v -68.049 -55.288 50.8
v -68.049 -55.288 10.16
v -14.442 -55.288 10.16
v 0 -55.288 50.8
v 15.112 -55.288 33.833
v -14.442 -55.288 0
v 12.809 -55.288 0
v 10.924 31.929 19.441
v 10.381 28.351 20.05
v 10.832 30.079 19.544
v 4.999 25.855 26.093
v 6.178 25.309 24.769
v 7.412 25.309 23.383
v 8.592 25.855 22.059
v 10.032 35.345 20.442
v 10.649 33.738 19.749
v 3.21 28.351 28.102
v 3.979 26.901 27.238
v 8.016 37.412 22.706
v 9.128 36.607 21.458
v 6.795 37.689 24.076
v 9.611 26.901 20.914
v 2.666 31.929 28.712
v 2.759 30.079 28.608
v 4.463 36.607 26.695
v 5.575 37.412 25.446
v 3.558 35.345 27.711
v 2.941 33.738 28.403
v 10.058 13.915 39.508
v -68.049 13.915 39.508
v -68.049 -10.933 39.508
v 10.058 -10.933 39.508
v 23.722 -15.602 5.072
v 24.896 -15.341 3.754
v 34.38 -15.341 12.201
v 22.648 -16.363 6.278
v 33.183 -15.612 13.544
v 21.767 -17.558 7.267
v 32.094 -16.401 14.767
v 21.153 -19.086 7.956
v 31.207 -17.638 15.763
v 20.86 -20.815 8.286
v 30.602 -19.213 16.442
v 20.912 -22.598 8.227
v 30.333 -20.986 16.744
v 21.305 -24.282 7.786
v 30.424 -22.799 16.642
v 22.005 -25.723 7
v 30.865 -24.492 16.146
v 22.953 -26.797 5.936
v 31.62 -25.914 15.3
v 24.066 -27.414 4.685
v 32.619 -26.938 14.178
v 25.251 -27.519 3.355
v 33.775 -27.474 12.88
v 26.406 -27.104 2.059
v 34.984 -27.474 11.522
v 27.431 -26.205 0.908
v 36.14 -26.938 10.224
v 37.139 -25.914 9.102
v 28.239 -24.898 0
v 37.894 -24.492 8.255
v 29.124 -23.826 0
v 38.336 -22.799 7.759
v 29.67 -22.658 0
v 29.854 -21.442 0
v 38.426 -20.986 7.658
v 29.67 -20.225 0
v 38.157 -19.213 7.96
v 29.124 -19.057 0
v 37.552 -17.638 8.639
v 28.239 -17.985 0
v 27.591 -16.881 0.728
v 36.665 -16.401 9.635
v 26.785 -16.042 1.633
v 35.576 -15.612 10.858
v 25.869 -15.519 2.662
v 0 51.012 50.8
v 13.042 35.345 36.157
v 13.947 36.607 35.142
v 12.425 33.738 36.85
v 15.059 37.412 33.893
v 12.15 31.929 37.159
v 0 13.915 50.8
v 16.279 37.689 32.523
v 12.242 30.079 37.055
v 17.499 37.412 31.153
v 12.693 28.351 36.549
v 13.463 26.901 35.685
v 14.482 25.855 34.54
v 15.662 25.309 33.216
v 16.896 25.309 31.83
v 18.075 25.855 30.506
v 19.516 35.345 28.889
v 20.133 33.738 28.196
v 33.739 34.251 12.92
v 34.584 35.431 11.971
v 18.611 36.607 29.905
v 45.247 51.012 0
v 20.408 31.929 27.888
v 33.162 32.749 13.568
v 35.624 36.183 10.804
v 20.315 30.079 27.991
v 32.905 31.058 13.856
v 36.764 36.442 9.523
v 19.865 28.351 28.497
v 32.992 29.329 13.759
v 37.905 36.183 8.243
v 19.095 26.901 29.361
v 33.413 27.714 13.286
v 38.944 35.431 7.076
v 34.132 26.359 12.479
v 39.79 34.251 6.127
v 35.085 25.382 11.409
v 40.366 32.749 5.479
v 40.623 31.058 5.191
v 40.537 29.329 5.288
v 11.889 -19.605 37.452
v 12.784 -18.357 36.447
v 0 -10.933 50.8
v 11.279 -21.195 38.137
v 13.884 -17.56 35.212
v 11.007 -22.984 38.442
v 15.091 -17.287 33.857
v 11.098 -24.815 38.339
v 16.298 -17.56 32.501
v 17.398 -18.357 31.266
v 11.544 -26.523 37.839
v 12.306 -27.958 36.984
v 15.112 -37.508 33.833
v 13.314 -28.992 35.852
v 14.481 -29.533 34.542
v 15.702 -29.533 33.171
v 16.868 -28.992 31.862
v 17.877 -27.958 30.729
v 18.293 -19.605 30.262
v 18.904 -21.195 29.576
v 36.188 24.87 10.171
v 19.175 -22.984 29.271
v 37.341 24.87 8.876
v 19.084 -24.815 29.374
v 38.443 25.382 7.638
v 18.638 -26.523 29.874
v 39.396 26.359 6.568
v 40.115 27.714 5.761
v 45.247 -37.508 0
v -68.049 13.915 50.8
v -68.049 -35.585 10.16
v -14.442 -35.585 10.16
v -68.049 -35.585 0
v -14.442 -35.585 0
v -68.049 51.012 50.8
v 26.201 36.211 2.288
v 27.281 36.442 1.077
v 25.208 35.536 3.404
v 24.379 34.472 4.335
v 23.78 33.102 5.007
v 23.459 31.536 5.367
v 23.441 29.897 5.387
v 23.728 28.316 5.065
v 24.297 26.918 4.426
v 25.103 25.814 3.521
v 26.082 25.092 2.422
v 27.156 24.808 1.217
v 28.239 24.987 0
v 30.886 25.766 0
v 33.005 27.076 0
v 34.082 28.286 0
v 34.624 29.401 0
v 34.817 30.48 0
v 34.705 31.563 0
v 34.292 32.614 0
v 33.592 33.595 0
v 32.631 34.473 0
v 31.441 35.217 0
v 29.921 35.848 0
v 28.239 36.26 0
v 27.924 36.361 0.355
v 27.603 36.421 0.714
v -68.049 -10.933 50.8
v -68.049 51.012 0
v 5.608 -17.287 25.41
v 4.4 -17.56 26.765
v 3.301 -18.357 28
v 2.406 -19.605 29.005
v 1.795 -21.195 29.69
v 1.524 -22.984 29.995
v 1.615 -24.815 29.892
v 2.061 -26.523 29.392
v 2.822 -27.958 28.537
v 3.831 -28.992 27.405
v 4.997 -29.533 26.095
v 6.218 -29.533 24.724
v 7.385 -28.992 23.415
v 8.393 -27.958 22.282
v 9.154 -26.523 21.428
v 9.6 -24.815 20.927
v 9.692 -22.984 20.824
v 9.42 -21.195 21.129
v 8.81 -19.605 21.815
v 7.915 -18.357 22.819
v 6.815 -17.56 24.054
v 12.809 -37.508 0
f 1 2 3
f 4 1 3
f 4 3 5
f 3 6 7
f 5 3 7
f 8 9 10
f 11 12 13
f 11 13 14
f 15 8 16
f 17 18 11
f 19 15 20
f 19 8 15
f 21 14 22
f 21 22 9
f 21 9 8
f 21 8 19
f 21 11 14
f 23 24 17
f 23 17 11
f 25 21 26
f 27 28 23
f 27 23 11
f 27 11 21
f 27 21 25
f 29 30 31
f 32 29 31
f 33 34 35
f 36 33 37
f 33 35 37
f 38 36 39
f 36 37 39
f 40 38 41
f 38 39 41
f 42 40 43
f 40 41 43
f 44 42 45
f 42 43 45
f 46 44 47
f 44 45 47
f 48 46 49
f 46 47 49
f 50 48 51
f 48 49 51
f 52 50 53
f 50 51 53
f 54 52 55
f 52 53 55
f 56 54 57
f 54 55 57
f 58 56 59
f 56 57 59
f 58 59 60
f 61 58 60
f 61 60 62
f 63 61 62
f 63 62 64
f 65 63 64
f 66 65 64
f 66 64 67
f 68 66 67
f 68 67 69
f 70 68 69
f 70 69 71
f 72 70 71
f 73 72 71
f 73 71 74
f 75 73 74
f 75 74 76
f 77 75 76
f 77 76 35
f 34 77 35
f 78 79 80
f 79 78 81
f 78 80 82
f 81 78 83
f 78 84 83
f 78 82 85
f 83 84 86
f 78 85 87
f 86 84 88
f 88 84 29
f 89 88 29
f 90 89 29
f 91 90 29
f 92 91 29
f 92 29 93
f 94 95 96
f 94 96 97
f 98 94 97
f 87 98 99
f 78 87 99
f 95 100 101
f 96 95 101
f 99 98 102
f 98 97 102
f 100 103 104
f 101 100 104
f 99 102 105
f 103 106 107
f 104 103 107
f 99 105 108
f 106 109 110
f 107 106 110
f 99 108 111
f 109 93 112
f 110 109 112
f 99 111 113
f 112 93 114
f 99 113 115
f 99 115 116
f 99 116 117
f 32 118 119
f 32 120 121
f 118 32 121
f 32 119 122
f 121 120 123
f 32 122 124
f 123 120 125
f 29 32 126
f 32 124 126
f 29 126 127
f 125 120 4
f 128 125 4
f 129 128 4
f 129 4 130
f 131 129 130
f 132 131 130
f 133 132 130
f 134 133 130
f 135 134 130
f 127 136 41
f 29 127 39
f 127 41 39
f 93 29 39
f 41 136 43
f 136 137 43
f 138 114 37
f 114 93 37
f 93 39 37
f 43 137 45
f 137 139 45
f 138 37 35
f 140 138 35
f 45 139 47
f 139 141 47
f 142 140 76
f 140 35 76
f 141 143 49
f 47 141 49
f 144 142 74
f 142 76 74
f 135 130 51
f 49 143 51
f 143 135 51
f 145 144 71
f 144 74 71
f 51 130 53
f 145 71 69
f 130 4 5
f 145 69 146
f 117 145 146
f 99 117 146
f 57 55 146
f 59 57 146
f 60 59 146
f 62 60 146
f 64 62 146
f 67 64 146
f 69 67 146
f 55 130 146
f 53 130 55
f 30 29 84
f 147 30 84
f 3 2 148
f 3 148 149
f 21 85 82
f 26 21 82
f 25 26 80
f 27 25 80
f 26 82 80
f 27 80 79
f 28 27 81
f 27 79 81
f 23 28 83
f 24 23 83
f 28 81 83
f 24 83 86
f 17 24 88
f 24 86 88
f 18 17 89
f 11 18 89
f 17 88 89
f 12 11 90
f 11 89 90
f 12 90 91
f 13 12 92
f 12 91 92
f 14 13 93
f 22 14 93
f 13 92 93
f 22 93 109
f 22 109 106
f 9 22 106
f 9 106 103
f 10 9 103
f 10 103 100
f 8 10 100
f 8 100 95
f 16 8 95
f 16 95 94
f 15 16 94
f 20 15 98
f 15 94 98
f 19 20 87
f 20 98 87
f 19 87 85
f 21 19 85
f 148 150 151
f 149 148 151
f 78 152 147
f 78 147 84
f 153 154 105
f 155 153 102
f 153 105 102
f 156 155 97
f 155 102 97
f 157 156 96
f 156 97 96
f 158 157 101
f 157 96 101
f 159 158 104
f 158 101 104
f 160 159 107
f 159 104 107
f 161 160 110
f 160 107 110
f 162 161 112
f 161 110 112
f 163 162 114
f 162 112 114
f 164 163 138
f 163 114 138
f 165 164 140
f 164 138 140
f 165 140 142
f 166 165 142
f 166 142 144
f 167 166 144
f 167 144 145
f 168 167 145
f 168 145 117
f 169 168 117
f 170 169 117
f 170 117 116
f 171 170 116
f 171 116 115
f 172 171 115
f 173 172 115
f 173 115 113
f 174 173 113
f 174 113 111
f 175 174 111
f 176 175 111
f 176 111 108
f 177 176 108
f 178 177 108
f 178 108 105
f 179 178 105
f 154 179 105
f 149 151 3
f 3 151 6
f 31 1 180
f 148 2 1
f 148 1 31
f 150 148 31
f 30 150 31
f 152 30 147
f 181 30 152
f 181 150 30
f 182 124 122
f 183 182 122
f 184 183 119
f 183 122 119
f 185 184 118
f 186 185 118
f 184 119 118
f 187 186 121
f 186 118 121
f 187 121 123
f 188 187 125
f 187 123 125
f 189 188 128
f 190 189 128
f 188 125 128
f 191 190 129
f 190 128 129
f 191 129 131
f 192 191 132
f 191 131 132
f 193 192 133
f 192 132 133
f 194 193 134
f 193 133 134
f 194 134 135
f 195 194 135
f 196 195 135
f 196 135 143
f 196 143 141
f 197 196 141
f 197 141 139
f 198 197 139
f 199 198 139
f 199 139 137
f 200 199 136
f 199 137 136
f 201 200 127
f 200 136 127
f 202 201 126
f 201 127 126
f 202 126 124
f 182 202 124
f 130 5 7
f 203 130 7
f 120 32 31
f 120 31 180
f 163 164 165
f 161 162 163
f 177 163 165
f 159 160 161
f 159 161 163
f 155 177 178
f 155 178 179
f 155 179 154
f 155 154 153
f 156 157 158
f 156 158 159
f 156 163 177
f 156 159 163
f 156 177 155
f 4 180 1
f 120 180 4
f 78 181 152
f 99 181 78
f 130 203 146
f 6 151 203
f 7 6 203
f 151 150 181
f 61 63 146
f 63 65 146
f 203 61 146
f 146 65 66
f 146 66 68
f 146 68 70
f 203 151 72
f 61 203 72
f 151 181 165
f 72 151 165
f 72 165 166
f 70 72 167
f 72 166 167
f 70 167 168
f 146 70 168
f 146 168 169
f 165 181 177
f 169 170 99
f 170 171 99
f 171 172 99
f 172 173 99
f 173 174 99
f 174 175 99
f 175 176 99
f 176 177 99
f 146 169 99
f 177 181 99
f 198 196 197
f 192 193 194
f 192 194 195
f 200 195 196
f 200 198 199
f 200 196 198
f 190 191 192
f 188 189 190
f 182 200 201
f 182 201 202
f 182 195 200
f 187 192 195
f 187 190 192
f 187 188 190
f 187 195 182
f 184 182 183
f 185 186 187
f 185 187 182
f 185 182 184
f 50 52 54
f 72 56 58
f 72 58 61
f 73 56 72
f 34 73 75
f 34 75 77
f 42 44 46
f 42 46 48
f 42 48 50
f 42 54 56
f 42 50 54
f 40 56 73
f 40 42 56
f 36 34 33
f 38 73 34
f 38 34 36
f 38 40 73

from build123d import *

# Parameters (mm, degrees)
F0_W      = 113.2952198386
F0_H      = 106.3001342118
F1_DEPTH  = 50.8
F3_DEPTH  = 106.3011342118
F4_W      = 24.8478278518
F4_H      = 11.2919552803
F5_DEPTH  = 113.2962198386
F6_R      = 6.1575495423
F6_R_2    = 6.1008384399
F6_R_3    = 6.2250154244
F6_R_4    = 5.8180696171
F7_DEPTH  = 12.7
F9_DEPTH  = 17.78
F11_DEPTH = 10.16


with BuildPart() as f1:
    # F0 (on Top) → F1 (new body)
    with BuildSketch(Plane.XY):
        with Locations((-11.4009939134, -2.1379012614)):
            Rectangle(F0_W, F0_H)
    extrude(amount=F1_DEPTH)

    # F2 (on face) → F3 (cut, through all)
    with BuildSketch(Plane.XZ.offset(55.2879683673)):
        Polygon((0, 50.8), (45.2466160059, 0), (45.2466160059, 50.8), align=None)
    extrude(amount=-F3_DEPTH, mode=Mode.SUBTRACT)

    # F4 (on face) → F5 (cut, through all)
    with BuildSketch(Plane(origin=(-68.0486038327, 0, 0), x_dir=(0, -1, 0), z_dir=(-1, 0, 0))):
        with Locations((-1.490868628, 45.1540223598)):
            Rectangle(F4_W, F4_H)
    extrude(amount=-F5_DEPTH, mode=Mode.SUBTRACT)

    # F6 (on face) → F7 (cut)
    with BuildSketch(Plane(origin=(25.2307356453, 0, 22.4725473876), x_dir=(0, 1, 0), z_dir=(0.7467442801, 0, 0.6651112539))):
        with Locations((-23.4444309026, 15.2448490262)):
            Circle(F6_R)
        with Locations((-21.4417409152, -13.7552563101)):
            Circle(F6_R_2)
        with Locations((31.4639918506, 13.4591702372)):
            Circle(F6_R_3)
        with Locations((30.6235197932, -17.3407215625)):
            Circle(F6_R_4)
    extrude(amount=-F7_DEPTH, mode=Mode.SUBTRACT)

    # F8 (on face) → F9 (cut)
    with BuildSketch(Plane.XZ.offset(55.2879683673)):
        Polygon((15.1122735132, 33.832908044), (12.8093063831, 0), (45.2466160059, 0), align=None)
    extrude(amount=-F9_DEPTH, mode=Mode.SUBTRACT)

    # F10 (on face) → F11 (cut)
    with BuildSketch(Plane(origin=(0, 0, 0), x_dir=(1, 0, 0), z_dir=(0, 0, -1))):
        Polygon((-14.4420871511, 35.5851622298), (-14.4420871511, 55.2879683673), (-68.0486038327, 55.2879683673), (-68.0486038327, 42.1527642757), (-68.0486038327, 35.5851622298), align=None)
    extrude(amount=-F11_DEPTH, mode=Mode.SUBTRACT)


solid = f1.part
